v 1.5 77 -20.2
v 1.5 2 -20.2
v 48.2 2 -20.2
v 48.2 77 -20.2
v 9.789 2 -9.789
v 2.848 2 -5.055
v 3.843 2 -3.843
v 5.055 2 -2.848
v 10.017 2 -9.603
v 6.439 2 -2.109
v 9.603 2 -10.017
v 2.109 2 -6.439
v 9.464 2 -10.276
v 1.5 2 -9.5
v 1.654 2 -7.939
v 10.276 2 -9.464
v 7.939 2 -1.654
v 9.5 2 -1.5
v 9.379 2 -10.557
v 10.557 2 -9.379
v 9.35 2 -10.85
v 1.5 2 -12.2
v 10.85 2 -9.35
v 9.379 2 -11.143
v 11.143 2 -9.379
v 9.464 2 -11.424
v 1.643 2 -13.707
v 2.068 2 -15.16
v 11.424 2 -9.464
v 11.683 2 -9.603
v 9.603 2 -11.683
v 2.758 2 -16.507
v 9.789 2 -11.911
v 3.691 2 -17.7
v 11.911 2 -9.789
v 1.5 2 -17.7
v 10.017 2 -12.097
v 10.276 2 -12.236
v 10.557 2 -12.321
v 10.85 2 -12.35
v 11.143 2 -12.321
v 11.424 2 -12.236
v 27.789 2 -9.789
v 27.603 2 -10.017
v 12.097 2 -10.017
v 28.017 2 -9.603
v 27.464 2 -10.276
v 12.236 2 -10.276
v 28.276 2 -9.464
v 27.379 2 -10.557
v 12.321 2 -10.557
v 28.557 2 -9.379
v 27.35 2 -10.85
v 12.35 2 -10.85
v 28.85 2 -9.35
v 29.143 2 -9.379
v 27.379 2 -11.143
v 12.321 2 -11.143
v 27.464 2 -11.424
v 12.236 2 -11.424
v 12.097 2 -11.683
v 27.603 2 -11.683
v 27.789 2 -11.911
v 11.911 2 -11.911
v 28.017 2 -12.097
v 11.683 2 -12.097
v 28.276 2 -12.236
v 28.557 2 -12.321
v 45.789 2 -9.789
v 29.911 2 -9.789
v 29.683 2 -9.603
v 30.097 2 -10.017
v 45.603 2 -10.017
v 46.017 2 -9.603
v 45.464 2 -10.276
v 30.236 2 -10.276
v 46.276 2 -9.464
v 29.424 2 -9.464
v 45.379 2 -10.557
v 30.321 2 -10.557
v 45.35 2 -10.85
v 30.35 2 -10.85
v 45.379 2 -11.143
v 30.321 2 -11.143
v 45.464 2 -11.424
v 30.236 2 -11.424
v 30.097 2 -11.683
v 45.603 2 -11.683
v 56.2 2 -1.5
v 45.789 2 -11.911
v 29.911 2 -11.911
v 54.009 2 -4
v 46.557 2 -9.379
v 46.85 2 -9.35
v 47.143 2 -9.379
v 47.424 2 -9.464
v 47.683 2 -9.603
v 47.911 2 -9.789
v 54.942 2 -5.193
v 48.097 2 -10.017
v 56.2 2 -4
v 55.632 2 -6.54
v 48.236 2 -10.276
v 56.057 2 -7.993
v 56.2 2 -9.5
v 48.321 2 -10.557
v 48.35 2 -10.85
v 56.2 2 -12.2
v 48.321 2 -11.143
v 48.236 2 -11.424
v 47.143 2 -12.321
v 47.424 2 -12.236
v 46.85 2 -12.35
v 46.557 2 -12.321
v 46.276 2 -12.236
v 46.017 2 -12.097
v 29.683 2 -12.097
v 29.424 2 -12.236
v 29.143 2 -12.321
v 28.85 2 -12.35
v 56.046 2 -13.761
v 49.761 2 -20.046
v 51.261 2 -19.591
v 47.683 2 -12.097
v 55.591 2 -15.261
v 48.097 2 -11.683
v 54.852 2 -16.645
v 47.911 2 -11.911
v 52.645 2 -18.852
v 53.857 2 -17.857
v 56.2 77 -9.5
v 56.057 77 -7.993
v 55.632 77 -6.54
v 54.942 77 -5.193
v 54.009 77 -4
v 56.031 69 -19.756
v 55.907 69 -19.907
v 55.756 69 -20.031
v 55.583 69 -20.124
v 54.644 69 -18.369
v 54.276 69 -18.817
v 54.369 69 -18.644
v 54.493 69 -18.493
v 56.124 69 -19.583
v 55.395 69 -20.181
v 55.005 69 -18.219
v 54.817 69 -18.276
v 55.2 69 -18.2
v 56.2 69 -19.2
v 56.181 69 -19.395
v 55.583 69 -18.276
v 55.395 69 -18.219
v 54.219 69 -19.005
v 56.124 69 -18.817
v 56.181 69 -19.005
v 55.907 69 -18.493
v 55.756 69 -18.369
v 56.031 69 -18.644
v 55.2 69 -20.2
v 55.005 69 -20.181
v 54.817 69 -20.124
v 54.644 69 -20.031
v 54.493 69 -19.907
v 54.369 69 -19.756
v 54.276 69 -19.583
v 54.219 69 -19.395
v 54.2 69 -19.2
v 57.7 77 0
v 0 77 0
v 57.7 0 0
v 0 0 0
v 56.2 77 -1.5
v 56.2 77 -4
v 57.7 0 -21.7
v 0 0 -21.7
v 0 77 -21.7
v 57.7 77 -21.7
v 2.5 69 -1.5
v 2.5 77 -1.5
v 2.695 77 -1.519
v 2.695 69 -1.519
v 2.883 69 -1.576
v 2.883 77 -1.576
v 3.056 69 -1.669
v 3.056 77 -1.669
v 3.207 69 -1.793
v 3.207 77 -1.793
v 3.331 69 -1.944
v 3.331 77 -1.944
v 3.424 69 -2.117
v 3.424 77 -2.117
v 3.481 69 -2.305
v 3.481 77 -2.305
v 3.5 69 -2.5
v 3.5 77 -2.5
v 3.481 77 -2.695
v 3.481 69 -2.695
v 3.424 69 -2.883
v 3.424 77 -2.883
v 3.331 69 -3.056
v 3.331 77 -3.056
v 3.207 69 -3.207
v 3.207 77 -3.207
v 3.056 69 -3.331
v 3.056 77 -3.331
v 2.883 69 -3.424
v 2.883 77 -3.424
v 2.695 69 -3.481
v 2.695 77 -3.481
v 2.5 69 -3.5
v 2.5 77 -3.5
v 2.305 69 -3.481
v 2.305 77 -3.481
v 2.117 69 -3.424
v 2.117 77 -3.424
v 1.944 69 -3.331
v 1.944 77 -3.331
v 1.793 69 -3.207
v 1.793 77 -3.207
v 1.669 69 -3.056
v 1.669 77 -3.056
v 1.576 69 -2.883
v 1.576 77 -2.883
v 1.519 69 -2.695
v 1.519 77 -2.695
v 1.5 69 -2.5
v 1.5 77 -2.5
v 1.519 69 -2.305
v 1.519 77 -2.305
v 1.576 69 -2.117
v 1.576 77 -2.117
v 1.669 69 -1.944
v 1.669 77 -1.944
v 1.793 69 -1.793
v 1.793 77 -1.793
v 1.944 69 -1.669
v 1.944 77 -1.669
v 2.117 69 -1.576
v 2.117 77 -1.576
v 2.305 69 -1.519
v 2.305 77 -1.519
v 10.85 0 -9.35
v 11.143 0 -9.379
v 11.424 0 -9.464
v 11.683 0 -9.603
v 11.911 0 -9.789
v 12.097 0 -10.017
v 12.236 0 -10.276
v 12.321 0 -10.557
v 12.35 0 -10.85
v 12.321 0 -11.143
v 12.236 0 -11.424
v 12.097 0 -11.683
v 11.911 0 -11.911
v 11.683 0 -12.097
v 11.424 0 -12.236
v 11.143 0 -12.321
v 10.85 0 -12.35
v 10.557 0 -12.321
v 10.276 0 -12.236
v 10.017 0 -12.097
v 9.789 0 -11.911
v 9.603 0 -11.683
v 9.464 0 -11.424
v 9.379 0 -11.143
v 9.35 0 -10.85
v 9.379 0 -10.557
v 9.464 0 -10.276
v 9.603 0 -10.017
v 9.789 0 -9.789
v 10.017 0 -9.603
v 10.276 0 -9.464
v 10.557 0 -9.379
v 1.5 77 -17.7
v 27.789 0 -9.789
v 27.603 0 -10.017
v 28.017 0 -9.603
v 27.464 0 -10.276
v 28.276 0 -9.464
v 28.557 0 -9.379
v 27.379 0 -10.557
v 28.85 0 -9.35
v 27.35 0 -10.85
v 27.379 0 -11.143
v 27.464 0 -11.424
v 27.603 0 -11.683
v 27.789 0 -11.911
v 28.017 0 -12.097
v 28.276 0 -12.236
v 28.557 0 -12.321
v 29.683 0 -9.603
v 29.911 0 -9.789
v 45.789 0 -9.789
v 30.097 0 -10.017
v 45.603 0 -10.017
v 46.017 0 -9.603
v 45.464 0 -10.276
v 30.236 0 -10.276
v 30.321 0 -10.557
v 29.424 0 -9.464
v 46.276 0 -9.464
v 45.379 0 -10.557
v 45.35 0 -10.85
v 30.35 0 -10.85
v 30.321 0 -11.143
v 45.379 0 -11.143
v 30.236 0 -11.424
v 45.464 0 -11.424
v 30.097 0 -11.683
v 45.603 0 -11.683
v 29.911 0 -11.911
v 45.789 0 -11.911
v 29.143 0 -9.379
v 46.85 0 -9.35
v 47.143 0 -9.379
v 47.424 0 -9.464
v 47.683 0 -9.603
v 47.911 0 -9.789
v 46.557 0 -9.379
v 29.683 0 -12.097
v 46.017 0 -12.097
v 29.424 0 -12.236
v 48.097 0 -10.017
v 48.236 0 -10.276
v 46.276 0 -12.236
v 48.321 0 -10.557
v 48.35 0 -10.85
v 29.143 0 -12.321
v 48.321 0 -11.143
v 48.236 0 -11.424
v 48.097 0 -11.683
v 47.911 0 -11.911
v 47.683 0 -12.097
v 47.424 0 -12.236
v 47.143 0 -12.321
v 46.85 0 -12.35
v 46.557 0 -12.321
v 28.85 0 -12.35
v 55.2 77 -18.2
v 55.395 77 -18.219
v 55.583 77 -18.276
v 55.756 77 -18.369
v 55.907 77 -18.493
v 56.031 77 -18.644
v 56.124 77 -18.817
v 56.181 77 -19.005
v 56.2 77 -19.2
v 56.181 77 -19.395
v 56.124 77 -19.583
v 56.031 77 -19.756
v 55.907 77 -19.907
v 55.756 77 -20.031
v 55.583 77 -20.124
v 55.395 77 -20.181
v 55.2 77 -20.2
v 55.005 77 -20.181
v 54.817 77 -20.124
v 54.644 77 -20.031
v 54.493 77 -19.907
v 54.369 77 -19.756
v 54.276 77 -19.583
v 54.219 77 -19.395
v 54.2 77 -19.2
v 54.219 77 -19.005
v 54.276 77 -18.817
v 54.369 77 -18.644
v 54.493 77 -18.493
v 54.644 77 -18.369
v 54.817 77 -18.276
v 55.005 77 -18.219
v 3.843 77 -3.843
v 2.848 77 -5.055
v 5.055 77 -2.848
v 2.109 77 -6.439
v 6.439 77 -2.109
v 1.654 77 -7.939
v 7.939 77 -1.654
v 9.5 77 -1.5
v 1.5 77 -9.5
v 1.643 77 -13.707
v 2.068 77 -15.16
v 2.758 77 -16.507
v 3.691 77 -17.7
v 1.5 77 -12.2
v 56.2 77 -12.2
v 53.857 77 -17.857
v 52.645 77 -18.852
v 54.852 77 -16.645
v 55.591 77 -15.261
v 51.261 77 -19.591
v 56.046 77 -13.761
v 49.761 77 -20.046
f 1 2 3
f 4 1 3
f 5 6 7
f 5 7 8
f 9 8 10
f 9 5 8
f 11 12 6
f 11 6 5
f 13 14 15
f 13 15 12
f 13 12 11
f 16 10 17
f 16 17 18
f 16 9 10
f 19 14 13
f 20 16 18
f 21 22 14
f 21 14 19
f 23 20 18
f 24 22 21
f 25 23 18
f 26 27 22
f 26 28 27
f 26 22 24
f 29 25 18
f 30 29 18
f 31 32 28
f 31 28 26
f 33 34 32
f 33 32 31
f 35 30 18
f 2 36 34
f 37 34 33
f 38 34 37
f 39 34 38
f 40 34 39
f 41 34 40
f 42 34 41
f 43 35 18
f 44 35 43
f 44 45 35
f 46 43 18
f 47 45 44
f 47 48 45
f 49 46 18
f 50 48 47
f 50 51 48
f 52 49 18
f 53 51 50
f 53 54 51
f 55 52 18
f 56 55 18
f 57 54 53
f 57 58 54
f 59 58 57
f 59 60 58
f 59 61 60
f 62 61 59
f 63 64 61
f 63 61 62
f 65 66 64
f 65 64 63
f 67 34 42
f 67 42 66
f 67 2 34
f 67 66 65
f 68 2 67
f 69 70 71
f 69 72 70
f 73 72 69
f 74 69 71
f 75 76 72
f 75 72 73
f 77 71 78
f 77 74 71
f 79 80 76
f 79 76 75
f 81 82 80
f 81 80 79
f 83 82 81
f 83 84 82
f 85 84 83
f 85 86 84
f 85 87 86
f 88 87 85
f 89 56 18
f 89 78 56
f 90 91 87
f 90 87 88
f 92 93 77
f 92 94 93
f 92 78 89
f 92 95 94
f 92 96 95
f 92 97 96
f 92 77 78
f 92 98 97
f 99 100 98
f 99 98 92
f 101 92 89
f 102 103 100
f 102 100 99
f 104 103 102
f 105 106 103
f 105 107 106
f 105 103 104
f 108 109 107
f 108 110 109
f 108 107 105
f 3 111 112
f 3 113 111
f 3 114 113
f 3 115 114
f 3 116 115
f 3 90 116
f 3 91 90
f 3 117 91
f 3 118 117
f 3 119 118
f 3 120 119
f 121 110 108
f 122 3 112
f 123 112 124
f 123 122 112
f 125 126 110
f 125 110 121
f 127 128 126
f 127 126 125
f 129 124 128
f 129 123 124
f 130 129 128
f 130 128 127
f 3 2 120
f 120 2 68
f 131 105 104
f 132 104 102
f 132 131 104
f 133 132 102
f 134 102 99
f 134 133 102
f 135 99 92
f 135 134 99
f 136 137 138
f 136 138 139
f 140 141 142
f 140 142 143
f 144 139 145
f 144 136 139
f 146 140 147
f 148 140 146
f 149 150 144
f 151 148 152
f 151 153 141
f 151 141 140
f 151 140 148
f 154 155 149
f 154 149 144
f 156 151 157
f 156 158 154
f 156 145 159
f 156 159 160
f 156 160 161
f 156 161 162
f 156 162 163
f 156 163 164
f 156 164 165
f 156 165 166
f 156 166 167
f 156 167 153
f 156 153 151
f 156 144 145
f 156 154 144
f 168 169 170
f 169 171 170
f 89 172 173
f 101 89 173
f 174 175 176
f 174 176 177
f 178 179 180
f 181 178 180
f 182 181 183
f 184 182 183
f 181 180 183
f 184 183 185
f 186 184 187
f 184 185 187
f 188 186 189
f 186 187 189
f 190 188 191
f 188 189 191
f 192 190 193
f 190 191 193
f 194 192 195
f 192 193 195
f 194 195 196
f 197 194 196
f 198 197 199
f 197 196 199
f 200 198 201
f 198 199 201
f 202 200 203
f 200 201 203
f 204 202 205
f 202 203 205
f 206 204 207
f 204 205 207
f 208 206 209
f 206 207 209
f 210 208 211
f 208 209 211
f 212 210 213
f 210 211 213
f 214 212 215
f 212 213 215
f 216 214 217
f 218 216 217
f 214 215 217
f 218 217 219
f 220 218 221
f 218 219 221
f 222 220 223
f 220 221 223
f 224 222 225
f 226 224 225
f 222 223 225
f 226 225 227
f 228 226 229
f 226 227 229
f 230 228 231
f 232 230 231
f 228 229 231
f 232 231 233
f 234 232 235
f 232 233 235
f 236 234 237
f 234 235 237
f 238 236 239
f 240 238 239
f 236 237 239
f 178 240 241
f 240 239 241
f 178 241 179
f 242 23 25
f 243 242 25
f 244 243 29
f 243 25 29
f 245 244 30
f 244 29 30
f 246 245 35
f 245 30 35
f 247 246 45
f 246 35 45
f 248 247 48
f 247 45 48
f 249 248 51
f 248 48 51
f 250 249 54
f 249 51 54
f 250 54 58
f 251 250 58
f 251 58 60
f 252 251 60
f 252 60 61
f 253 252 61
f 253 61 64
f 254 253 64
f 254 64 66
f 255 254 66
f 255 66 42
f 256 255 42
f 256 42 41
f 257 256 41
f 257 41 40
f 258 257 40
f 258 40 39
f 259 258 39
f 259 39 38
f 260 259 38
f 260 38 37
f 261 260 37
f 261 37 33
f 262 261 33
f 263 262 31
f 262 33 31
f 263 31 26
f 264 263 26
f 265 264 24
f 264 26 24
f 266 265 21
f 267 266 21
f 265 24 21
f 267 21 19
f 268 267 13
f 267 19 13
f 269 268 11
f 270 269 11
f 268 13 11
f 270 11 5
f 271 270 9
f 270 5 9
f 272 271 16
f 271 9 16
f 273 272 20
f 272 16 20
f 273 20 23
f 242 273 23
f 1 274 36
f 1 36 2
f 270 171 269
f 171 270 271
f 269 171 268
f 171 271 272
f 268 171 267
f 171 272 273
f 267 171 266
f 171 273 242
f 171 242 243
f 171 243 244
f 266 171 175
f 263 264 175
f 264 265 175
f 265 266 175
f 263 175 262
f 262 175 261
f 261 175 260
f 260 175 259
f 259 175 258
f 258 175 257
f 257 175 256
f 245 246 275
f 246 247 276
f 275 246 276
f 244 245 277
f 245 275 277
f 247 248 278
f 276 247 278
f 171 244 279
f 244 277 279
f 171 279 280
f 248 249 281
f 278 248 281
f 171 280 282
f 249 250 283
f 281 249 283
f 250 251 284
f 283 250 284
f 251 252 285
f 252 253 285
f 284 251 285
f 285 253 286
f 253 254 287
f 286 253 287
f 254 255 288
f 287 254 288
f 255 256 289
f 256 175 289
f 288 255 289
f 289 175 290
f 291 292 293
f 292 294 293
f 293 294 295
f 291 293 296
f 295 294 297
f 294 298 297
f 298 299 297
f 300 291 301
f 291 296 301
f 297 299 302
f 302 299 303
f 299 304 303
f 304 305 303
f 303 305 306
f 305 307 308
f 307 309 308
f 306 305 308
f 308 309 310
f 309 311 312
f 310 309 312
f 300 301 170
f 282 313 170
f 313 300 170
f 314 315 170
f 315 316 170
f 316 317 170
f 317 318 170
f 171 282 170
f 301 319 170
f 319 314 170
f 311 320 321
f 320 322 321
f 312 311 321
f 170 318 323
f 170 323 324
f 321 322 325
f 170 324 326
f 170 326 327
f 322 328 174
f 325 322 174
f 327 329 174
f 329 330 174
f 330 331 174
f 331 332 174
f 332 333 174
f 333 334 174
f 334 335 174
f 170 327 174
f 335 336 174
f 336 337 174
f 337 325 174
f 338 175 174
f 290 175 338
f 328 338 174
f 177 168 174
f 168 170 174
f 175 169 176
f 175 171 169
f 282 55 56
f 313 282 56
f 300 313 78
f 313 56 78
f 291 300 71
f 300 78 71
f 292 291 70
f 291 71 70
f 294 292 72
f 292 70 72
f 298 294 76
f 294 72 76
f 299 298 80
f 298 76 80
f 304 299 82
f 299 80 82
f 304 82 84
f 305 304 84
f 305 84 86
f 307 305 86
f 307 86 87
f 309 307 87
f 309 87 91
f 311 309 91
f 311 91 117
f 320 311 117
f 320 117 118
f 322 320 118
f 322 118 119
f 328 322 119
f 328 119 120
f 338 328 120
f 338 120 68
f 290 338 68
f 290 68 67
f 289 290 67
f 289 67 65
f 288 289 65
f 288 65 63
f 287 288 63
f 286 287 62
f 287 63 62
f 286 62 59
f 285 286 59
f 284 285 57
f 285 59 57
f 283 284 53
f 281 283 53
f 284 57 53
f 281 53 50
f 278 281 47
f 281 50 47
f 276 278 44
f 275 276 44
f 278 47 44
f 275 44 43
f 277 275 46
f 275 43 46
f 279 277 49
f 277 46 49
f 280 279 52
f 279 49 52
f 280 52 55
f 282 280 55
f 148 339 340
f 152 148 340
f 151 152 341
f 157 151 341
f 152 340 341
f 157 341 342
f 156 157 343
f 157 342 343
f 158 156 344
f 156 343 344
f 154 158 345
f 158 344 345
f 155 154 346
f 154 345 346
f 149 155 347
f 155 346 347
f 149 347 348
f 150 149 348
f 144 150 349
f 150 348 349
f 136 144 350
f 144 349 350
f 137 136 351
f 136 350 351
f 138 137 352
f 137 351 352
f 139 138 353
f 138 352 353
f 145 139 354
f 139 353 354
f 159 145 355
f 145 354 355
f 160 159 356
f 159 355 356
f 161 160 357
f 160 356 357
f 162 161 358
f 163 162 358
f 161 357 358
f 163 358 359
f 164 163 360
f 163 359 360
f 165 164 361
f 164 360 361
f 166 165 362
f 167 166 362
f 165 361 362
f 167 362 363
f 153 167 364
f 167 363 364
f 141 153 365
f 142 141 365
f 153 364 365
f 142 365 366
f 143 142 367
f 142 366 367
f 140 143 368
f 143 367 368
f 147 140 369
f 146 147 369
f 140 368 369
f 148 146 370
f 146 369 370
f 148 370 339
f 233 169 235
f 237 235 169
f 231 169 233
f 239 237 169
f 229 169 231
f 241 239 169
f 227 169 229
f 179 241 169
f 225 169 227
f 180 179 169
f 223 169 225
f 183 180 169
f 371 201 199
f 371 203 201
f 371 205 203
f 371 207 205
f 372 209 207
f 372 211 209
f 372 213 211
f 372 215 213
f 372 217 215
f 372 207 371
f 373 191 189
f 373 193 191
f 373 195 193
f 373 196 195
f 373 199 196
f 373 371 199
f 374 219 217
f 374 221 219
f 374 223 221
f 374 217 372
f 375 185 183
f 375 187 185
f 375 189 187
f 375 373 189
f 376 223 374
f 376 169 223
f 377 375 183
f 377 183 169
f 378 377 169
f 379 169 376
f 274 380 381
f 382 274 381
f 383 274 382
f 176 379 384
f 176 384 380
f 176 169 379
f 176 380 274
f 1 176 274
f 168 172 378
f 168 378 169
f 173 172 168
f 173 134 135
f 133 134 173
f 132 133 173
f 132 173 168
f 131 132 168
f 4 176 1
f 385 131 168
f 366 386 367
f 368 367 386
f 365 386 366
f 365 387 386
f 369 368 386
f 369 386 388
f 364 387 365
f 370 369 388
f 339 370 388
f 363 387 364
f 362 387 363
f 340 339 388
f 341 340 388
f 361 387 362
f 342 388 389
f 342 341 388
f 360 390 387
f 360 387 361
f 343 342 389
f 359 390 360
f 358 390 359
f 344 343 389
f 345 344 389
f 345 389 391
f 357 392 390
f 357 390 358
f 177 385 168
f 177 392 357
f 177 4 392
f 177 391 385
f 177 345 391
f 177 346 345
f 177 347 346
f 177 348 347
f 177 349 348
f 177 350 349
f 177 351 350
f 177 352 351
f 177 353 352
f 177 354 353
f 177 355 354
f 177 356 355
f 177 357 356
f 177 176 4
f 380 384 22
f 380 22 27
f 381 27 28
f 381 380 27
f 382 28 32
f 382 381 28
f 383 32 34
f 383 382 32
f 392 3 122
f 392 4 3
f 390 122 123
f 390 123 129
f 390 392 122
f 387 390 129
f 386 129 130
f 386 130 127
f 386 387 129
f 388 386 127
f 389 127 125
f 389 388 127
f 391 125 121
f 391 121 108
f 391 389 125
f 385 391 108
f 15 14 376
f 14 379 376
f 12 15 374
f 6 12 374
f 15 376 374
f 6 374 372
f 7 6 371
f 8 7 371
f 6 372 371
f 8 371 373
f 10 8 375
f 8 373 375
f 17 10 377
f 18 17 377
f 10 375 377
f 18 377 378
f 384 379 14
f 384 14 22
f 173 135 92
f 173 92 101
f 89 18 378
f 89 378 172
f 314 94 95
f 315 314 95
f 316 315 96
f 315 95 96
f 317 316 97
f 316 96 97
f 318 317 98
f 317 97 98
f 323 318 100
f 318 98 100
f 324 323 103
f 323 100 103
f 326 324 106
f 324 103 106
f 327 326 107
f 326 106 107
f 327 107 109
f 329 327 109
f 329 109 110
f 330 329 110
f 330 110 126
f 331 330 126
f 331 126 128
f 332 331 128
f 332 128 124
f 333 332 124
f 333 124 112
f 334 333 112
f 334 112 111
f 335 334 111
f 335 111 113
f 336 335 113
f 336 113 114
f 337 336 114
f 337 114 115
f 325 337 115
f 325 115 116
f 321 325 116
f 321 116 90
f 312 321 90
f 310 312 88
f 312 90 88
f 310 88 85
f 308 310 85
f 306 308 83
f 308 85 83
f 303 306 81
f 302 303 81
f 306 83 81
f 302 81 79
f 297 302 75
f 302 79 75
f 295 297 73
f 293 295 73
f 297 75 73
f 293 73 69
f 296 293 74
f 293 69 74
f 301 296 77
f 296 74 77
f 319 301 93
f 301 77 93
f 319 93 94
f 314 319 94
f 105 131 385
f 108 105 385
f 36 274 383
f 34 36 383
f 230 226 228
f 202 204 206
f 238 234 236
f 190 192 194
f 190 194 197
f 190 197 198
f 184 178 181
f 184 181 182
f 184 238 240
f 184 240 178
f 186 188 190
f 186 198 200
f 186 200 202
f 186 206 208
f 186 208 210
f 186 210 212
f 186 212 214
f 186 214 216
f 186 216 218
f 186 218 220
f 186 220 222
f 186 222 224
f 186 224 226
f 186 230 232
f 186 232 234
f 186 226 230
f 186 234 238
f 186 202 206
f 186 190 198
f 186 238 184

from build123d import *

# Parameters (mm, degrees)
SKETCH1_W           = 57.7
SKETCH1_H           = 21.7
BOSS_EXTRUDE1_DEPTH = 2
SKETCH2_W           = 57.7
SKETCH2_H           = 21.7
SKETCH2_W_2         = 54.7
SKETCH2_H_2         = 18.7
BOSS_EXTRUDE2_DEPTH = 75
FILLET1_R           = 8
SKETCH3_W           = 38.583587397
SKETCH3_H           = 2.5
CUT_EXTRUDE1_DEPTH  = 75
SKETCH4_W           = 17.089400488
SKETCH4_H           = 2.5
CUT_EXTRUDE2_DEPTH  = 75
SKETCH5_R           = 1
CUT_EXTRUDE3_DEPTH  = 8
SKETCH6_R           = 1.5
CUT_EXTRUDE4_DEPTH  = 10


with BuildPart() as part:
    # Sketch1 → Boss-Extrude1 (new body)
    with BuildSketch(Plane(origin=(0, 0, 0), x_dir=(1, 0, 0), z_dir=(0, 1, 0))):
        with Locations((28.85, 10.85)):
            Rectangle(SKETCH1_W, SKETCH1_H)
    extrude(amount=BOSS_EXTRUDE1_DEPTH)

    # Sketch2 → Boss-Extrude2 (add)
    with BuildSketch(Plane(origin=(0, 2, 0), x_dir=(1, 0, 0), z_dir=(0, 1, 0))):
        with Locations((28.85, 10.85)):
            Rectangle(SKETCH2_W, SKETCH2_H)
        with Locations((28.85, 10.85)):
            Rectangle(SKETCH2_W_2, SKETCH2_H_2, mode=Mode.SUBTRACT)
    extrude(amount=BOSS_EXTRUDE2_DEPTH)

    # Fillet1
    fillet1_edges = [part.edges().sort_by_distance(p)[0] for p in [
        (1.5, 39.5, -20.2),
        (1.5, 39.5, -1.5),
        (56.2, 39.5, -1.5),
        (56.2, 39.5, -20.2),
    ]]
    fillet(fillet1_edges, radius=FILLET1_R)

    # Sketch3 → Cut-Extrude1 (cut)
    with BuildSketch(Plane(origin=(0, 77, 0), x_dir=(1, 0, 0), z_dir=(0, 1, 0))):
        with Locations((20.791793699, 18.95)):
            Rectangle(SKETCH3_W, SKETCH3_H)
    extrude(amount=-CUT_EXTRUDE1_DEPTH, mode=Mode.SUBTRACT)

    # Sketch4 → Cut-Extrude2 (cut)
    with BuildSketch(Plane(origin=(0, 77, 0), x_dir=(1, 0, 0), z_dir=(0, 1, 0))):
        with Locations((47.655299756, 2.75)):
            Rectangle(SKETCH4_W, SKETCH4_H)
    extrude(amount=-CUT_EXTRUDE2_DEPTH, mode=Mode.SUBTRACT)

    # Sketch5 → Cut-Extrude3 (cut)
    with BuildSketch(Plane(origin=(0, 77, 0), x_dir=(1, 0, 0), z_dir=(0, 1, 0))):
        with Locations(Location((55.2, 19.2, 0), (0, 0, 270))):
            Circle(SKETCH5_R)
        with Locations(Location((2.5, 2.5, 0), (0, 0, 270))):
            Circle(SKETCH5_R)
    extrude(amount=-CUT_EXTRUDE3_DEPTH, mode=Mode.SUBTRACT)

    # Sketch6 → Cut-Extrude4 (cut)
    with BuildSketch(Plane(origin=(0, 2, 0), x_dir=(1, 0, 0), z_dir=(0, 1, 0))):
        with Locations(Location((28.85, 10.85, 0), (0, 0, 270))):
            Circle(SKETCH6_R)
        with Locations(Location((10.85, 10.85, 0), (0, 0, 270))):
            Circle(SKETCH6_R)
        with Locations(Location((46.85, 10.85, 0), (0, 0, 270))):
            Circle(SKETCH6_R)
    extrude(amount=-CUT_EXTRUDE4_DEPTH, mode=Mode.SUBTRACT)


solid = part.part
